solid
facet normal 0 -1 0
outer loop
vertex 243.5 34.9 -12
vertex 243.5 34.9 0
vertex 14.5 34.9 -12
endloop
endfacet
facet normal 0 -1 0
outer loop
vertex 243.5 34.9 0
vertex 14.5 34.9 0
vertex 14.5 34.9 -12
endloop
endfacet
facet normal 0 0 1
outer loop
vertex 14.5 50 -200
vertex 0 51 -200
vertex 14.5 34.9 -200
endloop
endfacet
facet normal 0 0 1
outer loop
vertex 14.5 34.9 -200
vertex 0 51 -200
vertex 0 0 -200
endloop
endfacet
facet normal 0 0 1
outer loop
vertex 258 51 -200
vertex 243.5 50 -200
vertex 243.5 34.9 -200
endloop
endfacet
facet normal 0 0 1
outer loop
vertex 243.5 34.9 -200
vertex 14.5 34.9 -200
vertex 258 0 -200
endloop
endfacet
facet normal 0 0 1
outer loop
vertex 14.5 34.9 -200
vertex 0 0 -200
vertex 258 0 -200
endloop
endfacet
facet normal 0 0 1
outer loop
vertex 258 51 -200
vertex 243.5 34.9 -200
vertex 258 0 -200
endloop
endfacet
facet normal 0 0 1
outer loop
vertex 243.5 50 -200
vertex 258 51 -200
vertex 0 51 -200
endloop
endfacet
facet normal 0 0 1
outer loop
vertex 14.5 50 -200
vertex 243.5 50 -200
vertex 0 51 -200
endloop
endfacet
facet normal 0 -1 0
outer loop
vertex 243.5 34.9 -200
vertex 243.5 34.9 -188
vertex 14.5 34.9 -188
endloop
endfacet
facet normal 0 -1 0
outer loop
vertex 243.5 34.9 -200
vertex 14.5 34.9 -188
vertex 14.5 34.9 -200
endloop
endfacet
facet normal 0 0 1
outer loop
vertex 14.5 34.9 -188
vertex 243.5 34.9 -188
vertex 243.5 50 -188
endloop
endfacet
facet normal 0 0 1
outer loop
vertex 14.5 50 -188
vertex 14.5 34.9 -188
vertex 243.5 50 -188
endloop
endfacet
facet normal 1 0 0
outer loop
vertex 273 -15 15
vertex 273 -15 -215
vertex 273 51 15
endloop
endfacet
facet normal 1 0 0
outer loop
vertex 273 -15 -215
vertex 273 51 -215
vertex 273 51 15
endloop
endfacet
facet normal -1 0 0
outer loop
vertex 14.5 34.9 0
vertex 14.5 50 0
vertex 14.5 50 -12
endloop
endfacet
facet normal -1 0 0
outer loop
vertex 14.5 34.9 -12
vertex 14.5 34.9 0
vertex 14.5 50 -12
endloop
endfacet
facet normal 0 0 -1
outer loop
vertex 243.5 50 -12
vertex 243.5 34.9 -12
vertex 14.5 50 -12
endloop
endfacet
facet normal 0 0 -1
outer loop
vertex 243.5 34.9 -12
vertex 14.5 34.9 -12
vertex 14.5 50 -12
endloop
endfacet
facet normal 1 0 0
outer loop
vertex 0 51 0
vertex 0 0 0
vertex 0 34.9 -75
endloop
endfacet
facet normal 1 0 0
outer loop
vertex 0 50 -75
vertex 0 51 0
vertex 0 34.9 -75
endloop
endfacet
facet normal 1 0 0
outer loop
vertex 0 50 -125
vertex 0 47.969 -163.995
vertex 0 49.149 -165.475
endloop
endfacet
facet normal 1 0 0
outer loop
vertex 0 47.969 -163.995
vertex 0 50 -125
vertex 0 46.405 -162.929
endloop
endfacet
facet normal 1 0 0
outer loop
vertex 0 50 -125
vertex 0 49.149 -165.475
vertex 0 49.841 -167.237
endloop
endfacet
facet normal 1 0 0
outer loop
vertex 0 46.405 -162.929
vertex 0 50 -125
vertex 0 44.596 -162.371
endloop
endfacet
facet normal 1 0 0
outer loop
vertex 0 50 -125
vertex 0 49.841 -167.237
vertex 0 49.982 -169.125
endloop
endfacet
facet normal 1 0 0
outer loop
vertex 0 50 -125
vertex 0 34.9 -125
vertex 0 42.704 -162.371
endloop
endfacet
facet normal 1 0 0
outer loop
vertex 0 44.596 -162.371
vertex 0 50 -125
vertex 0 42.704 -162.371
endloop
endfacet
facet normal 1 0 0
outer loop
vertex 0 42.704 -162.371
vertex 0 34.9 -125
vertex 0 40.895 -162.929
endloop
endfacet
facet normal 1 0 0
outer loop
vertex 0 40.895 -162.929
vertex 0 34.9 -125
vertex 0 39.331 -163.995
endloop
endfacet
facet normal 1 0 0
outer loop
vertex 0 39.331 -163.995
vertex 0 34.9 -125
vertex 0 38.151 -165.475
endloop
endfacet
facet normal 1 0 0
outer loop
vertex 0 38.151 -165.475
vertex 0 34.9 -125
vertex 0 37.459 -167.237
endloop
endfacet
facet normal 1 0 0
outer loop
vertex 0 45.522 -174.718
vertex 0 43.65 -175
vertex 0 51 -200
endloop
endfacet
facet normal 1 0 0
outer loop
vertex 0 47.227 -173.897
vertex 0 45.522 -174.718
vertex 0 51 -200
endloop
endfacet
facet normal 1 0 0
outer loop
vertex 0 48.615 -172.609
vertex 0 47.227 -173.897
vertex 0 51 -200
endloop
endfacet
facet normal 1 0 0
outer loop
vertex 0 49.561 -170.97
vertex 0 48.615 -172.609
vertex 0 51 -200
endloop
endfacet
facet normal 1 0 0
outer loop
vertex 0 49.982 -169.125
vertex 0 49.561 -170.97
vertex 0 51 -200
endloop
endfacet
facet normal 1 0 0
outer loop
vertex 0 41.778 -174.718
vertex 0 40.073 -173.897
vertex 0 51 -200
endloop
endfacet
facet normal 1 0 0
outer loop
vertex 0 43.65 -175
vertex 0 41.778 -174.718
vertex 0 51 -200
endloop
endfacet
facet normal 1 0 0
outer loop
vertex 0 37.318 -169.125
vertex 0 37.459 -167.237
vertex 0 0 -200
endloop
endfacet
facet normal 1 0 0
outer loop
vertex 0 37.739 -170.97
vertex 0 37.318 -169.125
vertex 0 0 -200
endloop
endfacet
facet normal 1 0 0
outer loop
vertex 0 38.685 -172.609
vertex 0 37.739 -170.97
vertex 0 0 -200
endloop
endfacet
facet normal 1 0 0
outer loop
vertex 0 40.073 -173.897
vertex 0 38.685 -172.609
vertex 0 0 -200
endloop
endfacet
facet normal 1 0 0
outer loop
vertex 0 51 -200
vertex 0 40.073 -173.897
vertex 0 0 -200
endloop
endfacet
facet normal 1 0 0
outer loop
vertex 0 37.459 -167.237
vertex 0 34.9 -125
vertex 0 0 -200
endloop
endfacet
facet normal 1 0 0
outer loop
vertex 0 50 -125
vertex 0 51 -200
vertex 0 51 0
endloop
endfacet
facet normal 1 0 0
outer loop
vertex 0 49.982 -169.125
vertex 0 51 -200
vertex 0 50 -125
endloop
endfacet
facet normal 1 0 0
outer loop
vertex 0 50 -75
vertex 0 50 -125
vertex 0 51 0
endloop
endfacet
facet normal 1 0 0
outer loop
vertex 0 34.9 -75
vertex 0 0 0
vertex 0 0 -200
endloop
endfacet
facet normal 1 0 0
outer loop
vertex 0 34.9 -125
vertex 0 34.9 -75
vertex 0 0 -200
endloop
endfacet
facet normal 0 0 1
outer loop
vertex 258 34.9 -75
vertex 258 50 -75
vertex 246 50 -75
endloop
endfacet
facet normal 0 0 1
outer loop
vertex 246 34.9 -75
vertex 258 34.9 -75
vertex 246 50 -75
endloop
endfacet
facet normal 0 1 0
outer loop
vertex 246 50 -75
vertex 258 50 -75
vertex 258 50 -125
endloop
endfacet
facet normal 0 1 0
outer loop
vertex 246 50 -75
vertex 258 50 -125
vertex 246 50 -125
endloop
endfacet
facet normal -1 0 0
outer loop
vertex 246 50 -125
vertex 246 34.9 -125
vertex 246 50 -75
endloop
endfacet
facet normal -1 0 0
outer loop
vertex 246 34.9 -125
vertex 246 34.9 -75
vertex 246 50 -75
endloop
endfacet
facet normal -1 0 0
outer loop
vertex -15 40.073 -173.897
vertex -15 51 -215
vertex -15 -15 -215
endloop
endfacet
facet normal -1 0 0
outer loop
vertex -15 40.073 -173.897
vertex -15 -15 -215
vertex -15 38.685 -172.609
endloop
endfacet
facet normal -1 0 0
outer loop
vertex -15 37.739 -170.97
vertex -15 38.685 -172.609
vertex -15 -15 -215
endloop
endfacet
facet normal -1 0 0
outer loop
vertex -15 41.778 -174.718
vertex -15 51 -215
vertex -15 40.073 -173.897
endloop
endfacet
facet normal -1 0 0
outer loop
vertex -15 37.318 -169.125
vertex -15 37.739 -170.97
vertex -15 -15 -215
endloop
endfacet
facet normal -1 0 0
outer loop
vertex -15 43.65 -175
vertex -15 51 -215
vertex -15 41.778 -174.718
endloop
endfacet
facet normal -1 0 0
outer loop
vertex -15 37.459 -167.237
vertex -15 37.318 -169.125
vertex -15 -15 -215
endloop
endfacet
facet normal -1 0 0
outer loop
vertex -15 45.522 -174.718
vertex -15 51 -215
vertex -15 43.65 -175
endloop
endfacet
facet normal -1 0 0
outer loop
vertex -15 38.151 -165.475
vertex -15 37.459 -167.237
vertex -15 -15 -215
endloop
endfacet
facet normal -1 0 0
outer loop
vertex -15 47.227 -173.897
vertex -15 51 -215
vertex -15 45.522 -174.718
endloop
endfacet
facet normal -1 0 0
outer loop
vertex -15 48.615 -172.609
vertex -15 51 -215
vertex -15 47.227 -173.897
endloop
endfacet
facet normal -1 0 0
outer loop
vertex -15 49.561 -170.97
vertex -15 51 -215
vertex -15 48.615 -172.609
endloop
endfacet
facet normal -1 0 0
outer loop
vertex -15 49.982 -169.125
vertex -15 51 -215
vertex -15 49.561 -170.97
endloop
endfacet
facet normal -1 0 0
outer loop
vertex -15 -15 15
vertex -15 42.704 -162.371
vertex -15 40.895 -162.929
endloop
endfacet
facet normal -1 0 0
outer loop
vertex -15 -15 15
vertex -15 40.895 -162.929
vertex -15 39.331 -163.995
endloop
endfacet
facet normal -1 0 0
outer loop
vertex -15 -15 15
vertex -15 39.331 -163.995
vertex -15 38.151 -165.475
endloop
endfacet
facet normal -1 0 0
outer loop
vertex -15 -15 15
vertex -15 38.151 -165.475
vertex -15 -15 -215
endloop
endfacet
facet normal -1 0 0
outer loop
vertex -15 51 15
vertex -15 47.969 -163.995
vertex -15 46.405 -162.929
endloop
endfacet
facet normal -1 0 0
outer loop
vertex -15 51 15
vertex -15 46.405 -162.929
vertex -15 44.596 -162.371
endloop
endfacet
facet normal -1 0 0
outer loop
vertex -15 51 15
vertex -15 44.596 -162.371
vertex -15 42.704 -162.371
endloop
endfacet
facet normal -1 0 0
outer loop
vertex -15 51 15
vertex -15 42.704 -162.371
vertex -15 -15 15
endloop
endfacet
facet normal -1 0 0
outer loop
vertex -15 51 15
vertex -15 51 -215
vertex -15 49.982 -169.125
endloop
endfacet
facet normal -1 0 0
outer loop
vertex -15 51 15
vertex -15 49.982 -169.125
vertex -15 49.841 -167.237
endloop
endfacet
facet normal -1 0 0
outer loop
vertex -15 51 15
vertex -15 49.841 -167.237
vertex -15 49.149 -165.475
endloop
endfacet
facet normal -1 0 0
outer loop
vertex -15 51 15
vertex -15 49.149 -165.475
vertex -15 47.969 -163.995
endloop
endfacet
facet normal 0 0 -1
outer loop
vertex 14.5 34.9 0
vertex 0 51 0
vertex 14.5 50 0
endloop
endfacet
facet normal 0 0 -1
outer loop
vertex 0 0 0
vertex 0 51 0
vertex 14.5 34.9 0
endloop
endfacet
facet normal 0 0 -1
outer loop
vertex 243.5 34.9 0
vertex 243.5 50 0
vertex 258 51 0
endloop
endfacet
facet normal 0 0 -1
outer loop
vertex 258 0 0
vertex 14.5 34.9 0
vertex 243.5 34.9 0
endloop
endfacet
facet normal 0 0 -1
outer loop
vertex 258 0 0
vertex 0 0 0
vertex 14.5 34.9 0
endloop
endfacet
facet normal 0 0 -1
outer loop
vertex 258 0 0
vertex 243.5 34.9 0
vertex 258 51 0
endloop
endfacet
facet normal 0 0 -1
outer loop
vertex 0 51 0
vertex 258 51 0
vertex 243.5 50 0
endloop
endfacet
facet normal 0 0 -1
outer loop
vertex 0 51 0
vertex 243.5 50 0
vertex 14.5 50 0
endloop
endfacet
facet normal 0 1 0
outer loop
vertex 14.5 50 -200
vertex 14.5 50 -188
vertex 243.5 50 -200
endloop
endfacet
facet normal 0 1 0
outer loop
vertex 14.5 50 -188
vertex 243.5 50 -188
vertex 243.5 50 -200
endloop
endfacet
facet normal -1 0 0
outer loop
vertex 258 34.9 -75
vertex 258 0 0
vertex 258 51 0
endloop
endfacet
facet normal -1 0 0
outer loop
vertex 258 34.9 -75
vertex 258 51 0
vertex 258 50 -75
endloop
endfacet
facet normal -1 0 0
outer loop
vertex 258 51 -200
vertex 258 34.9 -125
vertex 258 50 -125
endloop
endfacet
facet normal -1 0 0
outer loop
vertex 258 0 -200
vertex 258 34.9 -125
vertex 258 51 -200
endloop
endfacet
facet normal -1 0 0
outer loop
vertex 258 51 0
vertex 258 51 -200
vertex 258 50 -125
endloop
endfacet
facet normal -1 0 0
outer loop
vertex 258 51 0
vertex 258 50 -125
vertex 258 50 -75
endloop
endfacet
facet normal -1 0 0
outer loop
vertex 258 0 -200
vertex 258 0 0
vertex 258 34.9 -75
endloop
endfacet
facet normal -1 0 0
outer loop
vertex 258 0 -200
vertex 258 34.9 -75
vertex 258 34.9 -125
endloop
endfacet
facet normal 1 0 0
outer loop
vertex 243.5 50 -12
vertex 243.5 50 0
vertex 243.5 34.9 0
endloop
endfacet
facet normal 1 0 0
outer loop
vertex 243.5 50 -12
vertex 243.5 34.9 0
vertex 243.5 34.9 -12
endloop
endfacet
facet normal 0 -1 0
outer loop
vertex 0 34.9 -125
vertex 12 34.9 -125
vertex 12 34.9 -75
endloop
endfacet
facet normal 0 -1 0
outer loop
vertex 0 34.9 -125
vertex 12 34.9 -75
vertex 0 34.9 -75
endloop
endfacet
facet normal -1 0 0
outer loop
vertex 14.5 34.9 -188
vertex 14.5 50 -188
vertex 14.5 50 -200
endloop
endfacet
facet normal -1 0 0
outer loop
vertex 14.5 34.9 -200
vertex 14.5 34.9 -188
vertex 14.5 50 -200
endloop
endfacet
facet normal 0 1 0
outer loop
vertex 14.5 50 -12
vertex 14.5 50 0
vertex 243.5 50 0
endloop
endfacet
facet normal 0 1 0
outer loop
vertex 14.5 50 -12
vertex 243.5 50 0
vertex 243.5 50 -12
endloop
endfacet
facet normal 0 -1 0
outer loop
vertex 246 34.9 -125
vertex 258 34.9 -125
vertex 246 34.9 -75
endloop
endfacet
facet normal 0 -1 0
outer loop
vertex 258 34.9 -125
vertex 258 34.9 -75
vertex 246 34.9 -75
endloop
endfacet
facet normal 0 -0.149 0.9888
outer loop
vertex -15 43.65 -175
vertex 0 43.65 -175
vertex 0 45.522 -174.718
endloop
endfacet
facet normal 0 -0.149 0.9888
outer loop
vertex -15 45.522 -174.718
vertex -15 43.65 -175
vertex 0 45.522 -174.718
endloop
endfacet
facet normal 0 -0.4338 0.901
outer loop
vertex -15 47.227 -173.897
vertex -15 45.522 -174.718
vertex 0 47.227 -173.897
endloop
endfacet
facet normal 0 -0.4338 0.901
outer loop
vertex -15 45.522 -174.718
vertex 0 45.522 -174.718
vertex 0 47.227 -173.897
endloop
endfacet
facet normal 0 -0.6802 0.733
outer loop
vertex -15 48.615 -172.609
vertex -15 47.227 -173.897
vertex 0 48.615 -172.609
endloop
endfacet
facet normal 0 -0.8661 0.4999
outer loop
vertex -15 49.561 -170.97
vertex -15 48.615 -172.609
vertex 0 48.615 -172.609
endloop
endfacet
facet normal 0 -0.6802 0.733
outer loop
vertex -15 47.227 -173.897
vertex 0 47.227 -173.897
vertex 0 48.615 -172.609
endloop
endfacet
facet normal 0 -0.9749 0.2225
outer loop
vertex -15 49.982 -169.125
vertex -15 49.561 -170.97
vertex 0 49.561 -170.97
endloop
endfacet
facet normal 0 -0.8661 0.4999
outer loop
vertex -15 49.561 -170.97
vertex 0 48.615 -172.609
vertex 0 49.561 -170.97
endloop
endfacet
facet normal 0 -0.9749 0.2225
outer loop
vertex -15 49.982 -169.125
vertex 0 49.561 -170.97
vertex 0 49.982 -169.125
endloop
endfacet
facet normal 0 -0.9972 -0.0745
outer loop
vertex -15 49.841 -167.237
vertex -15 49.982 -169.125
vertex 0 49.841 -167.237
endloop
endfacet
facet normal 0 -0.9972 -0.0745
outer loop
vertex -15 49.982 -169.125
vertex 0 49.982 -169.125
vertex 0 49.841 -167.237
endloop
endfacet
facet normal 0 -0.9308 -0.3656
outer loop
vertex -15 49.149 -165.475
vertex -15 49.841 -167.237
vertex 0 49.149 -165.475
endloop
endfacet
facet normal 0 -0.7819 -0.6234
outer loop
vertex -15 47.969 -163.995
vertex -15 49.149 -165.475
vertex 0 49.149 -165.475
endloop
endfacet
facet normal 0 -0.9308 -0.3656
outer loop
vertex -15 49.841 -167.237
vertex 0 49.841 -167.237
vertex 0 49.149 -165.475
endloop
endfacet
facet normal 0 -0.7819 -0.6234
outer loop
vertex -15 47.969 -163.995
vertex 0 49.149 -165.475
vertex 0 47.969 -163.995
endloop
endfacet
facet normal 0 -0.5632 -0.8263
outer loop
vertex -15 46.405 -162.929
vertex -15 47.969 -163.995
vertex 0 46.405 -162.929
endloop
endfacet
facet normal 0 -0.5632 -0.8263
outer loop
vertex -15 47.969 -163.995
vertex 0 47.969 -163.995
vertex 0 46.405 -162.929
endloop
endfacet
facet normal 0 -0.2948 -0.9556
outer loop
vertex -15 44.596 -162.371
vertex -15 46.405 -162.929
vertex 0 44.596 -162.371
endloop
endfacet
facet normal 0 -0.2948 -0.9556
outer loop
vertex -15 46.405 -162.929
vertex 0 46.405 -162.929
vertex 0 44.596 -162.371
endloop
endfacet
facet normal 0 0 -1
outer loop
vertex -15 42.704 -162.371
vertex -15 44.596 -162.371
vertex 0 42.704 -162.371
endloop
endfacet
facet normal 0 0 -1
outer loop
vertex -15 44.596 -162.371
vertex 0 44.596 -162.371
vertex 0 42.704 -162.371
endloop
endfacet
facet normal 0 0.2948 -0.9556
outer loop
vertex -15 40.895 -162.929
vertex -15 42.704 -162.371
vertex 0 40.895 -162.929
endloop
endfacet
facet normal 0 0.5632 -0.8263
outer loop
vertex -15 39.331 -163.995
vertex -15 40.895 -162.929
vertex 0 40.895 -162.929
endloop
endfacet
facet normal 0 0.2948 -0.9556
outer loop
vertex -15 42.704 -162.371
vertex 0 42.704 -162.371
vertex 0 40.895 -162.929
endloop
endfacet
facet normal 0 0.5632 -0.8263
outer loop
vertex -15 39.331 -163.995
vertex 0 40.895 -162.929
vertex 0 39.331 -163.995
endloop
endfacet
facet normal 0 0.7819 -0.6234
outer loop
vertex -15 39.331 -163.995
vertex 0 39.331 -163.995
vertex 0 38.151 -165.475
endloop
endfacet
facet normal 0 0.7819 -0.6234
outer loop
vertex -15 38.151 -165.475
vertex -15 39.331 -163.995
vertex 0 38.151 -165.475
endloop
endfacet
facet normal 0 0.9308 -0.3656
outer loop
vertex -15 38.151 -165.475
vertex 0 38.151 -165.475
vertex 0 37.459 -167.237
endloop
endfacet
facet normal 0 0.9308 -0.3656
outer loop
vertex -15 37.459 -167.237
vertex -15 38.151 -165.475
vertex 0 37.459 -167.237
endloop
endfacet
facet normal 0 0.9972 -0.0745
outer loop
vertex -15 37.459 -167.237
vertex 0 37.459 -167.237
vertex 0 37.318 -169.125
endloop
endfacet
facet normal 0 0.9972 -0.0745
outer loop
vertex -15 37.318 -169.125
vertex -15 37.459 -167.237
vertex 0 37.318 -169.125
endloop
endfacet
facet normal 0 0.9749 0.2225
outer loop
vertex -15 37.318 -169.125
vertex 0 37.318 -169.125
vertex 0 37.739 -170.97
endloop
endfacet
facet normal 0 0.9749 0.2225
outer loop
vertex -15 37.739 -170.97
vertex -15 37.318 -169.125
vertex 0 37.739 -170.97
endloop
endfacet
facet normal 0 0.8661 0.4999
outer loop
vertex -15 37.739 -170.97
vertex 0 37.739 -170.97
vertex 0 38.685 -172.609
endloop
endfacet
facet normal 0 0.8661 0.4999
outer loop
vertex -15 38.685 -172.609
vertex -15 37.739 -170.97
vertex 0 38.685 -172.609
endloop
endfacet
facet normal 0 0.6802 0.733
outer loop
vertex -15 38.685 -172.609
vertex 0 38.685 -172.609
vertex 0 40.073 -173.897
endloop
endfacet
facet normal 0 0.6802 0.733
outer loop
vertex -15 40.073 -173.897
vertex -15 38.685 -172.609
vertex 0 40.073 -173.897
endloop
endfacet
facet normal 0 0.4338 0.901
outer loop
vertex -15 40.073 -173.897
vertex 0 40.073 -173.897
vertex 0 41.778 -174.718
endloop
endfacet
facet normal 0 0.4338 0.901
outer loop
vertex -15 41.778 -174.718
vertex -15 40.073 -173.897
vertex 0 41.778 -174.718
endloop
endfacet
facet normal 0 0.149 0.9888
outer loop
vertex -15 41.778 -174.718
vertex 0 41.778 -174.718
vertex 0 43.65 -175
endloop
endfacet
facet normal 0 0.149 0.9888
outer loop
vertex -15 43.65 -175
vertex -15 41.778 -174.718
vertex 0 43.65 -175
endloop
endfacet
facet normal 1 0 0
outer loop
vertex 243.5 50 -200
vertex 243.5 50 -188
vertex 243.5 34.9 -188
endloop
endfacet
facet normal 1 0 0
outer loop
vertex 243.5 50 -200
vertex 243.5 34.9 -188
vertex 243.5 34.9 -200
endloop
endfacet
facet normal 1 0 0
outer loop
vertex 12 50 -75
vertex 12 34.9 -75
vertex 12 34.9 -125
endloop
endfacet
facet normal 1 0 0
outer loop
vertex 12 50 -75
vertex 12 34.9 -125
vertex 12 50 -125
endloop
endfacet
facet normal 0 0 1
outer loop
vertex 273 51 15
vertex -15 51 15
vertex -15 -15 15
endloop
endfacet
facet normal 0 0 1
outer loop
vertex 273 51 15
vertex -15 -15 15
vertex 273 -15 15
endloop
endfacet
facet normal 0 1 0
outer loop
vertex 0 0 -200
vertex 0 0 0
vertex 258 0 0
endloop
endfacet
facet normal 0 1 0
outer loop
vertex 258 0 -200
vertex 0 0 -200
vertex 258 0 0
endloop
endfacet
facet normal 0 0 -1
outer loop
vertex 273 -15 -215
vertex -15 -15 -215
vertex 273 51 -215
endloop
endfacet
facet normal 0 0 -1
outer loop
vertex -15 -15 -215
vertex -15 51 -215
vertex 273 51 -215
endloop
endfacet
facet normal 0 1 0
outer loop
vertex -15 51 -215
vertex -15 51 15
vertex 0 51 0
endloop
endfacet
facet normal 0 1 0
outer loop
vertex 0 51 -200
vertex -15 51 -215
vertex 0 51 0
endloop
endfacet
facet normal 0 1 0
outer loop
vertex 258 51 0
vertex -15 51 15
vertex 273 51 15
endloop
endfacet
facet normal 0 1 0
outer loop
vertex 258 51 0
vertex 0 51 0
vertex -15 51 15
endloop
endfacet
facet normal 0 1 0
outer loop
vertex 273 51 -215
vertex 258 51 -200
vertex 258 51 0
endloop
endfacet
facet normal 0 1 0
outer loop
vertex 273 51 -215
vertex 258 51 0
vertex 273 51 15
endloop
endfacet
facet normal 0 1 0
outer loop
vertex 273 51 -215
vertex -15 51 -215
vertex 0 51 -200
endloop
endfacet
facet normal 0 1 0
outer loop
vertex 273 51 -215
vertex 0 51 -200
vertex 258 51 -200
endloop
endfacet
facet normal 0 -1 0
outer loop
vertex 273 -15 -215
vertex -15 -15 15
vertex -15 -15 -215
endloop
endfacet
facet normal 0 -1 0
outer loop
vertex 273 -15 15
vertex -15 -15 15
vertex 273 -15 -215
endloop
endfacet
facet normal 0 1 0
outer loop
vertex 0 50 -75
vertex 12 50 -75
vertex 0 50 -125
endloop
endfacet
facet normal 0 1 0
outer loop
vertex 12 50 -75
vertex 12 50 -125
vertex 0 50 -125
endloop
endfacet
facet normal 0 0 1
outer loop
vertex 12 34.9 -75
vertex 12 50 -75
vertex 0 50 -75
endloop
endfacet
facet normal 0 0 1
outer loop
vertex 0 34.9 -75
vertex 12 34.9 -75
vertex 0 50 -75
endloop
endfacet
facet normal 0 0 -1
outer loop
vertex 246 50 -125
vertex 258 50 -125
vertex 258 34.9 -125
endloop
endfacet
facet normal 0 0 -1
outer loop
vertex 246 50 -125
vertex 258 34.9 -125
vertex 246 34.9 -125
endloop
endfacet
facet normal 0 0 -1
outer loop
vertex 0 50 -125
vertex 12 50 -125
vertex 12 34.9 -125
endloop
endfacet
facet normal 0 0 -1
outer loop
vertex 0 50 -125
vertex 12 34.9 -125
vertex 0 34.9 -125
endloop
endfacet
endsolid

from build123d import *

# Parameters (mm, degrees)
SKETCH1_W           = 288
SKETCH1_H           = 230
SKETCH1_W_2         = 258
SKETCH1_H_2         = 200
WALLS_DEPTH         = 51
SKETCH3_W           = 288
SKETCH3_H           = 230
BASE_DEPTH          = 15
SKETCH4_W           = 12
SKETCH4_H           = 15.1
LONG_SUPPORT_DEPTH  = 114.5
SKETCH5_W           = 12
SKETCH5_H           = 15.1
SHORT_SUPPORT_DEPTH = 25
CUT_EXTRUDE4_REACH  = 353.219
SKETCH6_R           = 6.35


with BuildPart() as part:
    # Sketch1 → Walls (new body)
    with BuildSketch(Plane(origin=(0, 0, 0), x_dir=(1, 0, 0), z_dir=(0, 1, 0))):
        with Locations((129, 100)):
            Rectangle(SKETCH1_W, SKETCH1_H)
        with Locations((129, 100)):
            Rectangle(SKETCH1_W_2, SKETCH1_H_2, mode=Mode.SUBTRACT)
    extrude(amount=WALLS_DEPTH)

    # Sketch3 → Base (add)
    with BuildSketch(Plane.XZ):
        with Locations((129, -100)):
            Rectangle(SKETCH3_W, SKETCH3_H)
    extrude(amount=BASE_DEPTH)

    # Sketch4 → Long_Support (add, symmetric)
    with BuildSketch(Plane(origin=(129, 0, 0), x_dir=(0, 0, -1), z_dir=(1, 0, 0))):
        with Locations((6, 42.45)):
            Rectangle(SKETCH4_W, SKETCH4_H)
        with Locations((194, 42.45)):
            Rectangle(SKETCH4_W, SKETCH4_H)
    extrude(amount=LONG_SUPPORT_DEPTH, both=True)

    # Sketch5 → Short_Support (add, symmetric)
    with BuildSketch(Plane(origin=(0, 0, -100), x_dir=(-1, 0, 0), z_dir=(0, 0, -1))):
        with Locations((-252, 42.45)):
            Rectangle(SKETCH5_W, SKETCH5_H)
        with Locations((-6, 42.45)):
            Rectangle(SKETCH5_W, SKETCH5_H)
    extrude(amount=SHORT_SUPPORT_DEPTH, both=True)

    # Sketch6 → Cut-Extrude4 (cut, up to next)
    with BuildSketch(Plane(origin=(0, 0, 0), x_dir=(0, 0, -1), z_dir=(1, 0, 0)), mode=Mode.PRIVATE) as cut_extrude4_sk1:
        with Locations((168.65, 43.65)):
            Circle(SKETCH6_R)
    cut_extrude4_tool1 = extrude(cut_extrude4_sk1.sketch, amount=-CUT_EXTRUDE4_REACH, mode=Mode.PRIVATE) & part.part
    add(cut_extrude4_tool1.solids().sort_by_distance((0, 43.65, -168.65))[0], mode=Mode.SUBTRACT)


solid = part.part
